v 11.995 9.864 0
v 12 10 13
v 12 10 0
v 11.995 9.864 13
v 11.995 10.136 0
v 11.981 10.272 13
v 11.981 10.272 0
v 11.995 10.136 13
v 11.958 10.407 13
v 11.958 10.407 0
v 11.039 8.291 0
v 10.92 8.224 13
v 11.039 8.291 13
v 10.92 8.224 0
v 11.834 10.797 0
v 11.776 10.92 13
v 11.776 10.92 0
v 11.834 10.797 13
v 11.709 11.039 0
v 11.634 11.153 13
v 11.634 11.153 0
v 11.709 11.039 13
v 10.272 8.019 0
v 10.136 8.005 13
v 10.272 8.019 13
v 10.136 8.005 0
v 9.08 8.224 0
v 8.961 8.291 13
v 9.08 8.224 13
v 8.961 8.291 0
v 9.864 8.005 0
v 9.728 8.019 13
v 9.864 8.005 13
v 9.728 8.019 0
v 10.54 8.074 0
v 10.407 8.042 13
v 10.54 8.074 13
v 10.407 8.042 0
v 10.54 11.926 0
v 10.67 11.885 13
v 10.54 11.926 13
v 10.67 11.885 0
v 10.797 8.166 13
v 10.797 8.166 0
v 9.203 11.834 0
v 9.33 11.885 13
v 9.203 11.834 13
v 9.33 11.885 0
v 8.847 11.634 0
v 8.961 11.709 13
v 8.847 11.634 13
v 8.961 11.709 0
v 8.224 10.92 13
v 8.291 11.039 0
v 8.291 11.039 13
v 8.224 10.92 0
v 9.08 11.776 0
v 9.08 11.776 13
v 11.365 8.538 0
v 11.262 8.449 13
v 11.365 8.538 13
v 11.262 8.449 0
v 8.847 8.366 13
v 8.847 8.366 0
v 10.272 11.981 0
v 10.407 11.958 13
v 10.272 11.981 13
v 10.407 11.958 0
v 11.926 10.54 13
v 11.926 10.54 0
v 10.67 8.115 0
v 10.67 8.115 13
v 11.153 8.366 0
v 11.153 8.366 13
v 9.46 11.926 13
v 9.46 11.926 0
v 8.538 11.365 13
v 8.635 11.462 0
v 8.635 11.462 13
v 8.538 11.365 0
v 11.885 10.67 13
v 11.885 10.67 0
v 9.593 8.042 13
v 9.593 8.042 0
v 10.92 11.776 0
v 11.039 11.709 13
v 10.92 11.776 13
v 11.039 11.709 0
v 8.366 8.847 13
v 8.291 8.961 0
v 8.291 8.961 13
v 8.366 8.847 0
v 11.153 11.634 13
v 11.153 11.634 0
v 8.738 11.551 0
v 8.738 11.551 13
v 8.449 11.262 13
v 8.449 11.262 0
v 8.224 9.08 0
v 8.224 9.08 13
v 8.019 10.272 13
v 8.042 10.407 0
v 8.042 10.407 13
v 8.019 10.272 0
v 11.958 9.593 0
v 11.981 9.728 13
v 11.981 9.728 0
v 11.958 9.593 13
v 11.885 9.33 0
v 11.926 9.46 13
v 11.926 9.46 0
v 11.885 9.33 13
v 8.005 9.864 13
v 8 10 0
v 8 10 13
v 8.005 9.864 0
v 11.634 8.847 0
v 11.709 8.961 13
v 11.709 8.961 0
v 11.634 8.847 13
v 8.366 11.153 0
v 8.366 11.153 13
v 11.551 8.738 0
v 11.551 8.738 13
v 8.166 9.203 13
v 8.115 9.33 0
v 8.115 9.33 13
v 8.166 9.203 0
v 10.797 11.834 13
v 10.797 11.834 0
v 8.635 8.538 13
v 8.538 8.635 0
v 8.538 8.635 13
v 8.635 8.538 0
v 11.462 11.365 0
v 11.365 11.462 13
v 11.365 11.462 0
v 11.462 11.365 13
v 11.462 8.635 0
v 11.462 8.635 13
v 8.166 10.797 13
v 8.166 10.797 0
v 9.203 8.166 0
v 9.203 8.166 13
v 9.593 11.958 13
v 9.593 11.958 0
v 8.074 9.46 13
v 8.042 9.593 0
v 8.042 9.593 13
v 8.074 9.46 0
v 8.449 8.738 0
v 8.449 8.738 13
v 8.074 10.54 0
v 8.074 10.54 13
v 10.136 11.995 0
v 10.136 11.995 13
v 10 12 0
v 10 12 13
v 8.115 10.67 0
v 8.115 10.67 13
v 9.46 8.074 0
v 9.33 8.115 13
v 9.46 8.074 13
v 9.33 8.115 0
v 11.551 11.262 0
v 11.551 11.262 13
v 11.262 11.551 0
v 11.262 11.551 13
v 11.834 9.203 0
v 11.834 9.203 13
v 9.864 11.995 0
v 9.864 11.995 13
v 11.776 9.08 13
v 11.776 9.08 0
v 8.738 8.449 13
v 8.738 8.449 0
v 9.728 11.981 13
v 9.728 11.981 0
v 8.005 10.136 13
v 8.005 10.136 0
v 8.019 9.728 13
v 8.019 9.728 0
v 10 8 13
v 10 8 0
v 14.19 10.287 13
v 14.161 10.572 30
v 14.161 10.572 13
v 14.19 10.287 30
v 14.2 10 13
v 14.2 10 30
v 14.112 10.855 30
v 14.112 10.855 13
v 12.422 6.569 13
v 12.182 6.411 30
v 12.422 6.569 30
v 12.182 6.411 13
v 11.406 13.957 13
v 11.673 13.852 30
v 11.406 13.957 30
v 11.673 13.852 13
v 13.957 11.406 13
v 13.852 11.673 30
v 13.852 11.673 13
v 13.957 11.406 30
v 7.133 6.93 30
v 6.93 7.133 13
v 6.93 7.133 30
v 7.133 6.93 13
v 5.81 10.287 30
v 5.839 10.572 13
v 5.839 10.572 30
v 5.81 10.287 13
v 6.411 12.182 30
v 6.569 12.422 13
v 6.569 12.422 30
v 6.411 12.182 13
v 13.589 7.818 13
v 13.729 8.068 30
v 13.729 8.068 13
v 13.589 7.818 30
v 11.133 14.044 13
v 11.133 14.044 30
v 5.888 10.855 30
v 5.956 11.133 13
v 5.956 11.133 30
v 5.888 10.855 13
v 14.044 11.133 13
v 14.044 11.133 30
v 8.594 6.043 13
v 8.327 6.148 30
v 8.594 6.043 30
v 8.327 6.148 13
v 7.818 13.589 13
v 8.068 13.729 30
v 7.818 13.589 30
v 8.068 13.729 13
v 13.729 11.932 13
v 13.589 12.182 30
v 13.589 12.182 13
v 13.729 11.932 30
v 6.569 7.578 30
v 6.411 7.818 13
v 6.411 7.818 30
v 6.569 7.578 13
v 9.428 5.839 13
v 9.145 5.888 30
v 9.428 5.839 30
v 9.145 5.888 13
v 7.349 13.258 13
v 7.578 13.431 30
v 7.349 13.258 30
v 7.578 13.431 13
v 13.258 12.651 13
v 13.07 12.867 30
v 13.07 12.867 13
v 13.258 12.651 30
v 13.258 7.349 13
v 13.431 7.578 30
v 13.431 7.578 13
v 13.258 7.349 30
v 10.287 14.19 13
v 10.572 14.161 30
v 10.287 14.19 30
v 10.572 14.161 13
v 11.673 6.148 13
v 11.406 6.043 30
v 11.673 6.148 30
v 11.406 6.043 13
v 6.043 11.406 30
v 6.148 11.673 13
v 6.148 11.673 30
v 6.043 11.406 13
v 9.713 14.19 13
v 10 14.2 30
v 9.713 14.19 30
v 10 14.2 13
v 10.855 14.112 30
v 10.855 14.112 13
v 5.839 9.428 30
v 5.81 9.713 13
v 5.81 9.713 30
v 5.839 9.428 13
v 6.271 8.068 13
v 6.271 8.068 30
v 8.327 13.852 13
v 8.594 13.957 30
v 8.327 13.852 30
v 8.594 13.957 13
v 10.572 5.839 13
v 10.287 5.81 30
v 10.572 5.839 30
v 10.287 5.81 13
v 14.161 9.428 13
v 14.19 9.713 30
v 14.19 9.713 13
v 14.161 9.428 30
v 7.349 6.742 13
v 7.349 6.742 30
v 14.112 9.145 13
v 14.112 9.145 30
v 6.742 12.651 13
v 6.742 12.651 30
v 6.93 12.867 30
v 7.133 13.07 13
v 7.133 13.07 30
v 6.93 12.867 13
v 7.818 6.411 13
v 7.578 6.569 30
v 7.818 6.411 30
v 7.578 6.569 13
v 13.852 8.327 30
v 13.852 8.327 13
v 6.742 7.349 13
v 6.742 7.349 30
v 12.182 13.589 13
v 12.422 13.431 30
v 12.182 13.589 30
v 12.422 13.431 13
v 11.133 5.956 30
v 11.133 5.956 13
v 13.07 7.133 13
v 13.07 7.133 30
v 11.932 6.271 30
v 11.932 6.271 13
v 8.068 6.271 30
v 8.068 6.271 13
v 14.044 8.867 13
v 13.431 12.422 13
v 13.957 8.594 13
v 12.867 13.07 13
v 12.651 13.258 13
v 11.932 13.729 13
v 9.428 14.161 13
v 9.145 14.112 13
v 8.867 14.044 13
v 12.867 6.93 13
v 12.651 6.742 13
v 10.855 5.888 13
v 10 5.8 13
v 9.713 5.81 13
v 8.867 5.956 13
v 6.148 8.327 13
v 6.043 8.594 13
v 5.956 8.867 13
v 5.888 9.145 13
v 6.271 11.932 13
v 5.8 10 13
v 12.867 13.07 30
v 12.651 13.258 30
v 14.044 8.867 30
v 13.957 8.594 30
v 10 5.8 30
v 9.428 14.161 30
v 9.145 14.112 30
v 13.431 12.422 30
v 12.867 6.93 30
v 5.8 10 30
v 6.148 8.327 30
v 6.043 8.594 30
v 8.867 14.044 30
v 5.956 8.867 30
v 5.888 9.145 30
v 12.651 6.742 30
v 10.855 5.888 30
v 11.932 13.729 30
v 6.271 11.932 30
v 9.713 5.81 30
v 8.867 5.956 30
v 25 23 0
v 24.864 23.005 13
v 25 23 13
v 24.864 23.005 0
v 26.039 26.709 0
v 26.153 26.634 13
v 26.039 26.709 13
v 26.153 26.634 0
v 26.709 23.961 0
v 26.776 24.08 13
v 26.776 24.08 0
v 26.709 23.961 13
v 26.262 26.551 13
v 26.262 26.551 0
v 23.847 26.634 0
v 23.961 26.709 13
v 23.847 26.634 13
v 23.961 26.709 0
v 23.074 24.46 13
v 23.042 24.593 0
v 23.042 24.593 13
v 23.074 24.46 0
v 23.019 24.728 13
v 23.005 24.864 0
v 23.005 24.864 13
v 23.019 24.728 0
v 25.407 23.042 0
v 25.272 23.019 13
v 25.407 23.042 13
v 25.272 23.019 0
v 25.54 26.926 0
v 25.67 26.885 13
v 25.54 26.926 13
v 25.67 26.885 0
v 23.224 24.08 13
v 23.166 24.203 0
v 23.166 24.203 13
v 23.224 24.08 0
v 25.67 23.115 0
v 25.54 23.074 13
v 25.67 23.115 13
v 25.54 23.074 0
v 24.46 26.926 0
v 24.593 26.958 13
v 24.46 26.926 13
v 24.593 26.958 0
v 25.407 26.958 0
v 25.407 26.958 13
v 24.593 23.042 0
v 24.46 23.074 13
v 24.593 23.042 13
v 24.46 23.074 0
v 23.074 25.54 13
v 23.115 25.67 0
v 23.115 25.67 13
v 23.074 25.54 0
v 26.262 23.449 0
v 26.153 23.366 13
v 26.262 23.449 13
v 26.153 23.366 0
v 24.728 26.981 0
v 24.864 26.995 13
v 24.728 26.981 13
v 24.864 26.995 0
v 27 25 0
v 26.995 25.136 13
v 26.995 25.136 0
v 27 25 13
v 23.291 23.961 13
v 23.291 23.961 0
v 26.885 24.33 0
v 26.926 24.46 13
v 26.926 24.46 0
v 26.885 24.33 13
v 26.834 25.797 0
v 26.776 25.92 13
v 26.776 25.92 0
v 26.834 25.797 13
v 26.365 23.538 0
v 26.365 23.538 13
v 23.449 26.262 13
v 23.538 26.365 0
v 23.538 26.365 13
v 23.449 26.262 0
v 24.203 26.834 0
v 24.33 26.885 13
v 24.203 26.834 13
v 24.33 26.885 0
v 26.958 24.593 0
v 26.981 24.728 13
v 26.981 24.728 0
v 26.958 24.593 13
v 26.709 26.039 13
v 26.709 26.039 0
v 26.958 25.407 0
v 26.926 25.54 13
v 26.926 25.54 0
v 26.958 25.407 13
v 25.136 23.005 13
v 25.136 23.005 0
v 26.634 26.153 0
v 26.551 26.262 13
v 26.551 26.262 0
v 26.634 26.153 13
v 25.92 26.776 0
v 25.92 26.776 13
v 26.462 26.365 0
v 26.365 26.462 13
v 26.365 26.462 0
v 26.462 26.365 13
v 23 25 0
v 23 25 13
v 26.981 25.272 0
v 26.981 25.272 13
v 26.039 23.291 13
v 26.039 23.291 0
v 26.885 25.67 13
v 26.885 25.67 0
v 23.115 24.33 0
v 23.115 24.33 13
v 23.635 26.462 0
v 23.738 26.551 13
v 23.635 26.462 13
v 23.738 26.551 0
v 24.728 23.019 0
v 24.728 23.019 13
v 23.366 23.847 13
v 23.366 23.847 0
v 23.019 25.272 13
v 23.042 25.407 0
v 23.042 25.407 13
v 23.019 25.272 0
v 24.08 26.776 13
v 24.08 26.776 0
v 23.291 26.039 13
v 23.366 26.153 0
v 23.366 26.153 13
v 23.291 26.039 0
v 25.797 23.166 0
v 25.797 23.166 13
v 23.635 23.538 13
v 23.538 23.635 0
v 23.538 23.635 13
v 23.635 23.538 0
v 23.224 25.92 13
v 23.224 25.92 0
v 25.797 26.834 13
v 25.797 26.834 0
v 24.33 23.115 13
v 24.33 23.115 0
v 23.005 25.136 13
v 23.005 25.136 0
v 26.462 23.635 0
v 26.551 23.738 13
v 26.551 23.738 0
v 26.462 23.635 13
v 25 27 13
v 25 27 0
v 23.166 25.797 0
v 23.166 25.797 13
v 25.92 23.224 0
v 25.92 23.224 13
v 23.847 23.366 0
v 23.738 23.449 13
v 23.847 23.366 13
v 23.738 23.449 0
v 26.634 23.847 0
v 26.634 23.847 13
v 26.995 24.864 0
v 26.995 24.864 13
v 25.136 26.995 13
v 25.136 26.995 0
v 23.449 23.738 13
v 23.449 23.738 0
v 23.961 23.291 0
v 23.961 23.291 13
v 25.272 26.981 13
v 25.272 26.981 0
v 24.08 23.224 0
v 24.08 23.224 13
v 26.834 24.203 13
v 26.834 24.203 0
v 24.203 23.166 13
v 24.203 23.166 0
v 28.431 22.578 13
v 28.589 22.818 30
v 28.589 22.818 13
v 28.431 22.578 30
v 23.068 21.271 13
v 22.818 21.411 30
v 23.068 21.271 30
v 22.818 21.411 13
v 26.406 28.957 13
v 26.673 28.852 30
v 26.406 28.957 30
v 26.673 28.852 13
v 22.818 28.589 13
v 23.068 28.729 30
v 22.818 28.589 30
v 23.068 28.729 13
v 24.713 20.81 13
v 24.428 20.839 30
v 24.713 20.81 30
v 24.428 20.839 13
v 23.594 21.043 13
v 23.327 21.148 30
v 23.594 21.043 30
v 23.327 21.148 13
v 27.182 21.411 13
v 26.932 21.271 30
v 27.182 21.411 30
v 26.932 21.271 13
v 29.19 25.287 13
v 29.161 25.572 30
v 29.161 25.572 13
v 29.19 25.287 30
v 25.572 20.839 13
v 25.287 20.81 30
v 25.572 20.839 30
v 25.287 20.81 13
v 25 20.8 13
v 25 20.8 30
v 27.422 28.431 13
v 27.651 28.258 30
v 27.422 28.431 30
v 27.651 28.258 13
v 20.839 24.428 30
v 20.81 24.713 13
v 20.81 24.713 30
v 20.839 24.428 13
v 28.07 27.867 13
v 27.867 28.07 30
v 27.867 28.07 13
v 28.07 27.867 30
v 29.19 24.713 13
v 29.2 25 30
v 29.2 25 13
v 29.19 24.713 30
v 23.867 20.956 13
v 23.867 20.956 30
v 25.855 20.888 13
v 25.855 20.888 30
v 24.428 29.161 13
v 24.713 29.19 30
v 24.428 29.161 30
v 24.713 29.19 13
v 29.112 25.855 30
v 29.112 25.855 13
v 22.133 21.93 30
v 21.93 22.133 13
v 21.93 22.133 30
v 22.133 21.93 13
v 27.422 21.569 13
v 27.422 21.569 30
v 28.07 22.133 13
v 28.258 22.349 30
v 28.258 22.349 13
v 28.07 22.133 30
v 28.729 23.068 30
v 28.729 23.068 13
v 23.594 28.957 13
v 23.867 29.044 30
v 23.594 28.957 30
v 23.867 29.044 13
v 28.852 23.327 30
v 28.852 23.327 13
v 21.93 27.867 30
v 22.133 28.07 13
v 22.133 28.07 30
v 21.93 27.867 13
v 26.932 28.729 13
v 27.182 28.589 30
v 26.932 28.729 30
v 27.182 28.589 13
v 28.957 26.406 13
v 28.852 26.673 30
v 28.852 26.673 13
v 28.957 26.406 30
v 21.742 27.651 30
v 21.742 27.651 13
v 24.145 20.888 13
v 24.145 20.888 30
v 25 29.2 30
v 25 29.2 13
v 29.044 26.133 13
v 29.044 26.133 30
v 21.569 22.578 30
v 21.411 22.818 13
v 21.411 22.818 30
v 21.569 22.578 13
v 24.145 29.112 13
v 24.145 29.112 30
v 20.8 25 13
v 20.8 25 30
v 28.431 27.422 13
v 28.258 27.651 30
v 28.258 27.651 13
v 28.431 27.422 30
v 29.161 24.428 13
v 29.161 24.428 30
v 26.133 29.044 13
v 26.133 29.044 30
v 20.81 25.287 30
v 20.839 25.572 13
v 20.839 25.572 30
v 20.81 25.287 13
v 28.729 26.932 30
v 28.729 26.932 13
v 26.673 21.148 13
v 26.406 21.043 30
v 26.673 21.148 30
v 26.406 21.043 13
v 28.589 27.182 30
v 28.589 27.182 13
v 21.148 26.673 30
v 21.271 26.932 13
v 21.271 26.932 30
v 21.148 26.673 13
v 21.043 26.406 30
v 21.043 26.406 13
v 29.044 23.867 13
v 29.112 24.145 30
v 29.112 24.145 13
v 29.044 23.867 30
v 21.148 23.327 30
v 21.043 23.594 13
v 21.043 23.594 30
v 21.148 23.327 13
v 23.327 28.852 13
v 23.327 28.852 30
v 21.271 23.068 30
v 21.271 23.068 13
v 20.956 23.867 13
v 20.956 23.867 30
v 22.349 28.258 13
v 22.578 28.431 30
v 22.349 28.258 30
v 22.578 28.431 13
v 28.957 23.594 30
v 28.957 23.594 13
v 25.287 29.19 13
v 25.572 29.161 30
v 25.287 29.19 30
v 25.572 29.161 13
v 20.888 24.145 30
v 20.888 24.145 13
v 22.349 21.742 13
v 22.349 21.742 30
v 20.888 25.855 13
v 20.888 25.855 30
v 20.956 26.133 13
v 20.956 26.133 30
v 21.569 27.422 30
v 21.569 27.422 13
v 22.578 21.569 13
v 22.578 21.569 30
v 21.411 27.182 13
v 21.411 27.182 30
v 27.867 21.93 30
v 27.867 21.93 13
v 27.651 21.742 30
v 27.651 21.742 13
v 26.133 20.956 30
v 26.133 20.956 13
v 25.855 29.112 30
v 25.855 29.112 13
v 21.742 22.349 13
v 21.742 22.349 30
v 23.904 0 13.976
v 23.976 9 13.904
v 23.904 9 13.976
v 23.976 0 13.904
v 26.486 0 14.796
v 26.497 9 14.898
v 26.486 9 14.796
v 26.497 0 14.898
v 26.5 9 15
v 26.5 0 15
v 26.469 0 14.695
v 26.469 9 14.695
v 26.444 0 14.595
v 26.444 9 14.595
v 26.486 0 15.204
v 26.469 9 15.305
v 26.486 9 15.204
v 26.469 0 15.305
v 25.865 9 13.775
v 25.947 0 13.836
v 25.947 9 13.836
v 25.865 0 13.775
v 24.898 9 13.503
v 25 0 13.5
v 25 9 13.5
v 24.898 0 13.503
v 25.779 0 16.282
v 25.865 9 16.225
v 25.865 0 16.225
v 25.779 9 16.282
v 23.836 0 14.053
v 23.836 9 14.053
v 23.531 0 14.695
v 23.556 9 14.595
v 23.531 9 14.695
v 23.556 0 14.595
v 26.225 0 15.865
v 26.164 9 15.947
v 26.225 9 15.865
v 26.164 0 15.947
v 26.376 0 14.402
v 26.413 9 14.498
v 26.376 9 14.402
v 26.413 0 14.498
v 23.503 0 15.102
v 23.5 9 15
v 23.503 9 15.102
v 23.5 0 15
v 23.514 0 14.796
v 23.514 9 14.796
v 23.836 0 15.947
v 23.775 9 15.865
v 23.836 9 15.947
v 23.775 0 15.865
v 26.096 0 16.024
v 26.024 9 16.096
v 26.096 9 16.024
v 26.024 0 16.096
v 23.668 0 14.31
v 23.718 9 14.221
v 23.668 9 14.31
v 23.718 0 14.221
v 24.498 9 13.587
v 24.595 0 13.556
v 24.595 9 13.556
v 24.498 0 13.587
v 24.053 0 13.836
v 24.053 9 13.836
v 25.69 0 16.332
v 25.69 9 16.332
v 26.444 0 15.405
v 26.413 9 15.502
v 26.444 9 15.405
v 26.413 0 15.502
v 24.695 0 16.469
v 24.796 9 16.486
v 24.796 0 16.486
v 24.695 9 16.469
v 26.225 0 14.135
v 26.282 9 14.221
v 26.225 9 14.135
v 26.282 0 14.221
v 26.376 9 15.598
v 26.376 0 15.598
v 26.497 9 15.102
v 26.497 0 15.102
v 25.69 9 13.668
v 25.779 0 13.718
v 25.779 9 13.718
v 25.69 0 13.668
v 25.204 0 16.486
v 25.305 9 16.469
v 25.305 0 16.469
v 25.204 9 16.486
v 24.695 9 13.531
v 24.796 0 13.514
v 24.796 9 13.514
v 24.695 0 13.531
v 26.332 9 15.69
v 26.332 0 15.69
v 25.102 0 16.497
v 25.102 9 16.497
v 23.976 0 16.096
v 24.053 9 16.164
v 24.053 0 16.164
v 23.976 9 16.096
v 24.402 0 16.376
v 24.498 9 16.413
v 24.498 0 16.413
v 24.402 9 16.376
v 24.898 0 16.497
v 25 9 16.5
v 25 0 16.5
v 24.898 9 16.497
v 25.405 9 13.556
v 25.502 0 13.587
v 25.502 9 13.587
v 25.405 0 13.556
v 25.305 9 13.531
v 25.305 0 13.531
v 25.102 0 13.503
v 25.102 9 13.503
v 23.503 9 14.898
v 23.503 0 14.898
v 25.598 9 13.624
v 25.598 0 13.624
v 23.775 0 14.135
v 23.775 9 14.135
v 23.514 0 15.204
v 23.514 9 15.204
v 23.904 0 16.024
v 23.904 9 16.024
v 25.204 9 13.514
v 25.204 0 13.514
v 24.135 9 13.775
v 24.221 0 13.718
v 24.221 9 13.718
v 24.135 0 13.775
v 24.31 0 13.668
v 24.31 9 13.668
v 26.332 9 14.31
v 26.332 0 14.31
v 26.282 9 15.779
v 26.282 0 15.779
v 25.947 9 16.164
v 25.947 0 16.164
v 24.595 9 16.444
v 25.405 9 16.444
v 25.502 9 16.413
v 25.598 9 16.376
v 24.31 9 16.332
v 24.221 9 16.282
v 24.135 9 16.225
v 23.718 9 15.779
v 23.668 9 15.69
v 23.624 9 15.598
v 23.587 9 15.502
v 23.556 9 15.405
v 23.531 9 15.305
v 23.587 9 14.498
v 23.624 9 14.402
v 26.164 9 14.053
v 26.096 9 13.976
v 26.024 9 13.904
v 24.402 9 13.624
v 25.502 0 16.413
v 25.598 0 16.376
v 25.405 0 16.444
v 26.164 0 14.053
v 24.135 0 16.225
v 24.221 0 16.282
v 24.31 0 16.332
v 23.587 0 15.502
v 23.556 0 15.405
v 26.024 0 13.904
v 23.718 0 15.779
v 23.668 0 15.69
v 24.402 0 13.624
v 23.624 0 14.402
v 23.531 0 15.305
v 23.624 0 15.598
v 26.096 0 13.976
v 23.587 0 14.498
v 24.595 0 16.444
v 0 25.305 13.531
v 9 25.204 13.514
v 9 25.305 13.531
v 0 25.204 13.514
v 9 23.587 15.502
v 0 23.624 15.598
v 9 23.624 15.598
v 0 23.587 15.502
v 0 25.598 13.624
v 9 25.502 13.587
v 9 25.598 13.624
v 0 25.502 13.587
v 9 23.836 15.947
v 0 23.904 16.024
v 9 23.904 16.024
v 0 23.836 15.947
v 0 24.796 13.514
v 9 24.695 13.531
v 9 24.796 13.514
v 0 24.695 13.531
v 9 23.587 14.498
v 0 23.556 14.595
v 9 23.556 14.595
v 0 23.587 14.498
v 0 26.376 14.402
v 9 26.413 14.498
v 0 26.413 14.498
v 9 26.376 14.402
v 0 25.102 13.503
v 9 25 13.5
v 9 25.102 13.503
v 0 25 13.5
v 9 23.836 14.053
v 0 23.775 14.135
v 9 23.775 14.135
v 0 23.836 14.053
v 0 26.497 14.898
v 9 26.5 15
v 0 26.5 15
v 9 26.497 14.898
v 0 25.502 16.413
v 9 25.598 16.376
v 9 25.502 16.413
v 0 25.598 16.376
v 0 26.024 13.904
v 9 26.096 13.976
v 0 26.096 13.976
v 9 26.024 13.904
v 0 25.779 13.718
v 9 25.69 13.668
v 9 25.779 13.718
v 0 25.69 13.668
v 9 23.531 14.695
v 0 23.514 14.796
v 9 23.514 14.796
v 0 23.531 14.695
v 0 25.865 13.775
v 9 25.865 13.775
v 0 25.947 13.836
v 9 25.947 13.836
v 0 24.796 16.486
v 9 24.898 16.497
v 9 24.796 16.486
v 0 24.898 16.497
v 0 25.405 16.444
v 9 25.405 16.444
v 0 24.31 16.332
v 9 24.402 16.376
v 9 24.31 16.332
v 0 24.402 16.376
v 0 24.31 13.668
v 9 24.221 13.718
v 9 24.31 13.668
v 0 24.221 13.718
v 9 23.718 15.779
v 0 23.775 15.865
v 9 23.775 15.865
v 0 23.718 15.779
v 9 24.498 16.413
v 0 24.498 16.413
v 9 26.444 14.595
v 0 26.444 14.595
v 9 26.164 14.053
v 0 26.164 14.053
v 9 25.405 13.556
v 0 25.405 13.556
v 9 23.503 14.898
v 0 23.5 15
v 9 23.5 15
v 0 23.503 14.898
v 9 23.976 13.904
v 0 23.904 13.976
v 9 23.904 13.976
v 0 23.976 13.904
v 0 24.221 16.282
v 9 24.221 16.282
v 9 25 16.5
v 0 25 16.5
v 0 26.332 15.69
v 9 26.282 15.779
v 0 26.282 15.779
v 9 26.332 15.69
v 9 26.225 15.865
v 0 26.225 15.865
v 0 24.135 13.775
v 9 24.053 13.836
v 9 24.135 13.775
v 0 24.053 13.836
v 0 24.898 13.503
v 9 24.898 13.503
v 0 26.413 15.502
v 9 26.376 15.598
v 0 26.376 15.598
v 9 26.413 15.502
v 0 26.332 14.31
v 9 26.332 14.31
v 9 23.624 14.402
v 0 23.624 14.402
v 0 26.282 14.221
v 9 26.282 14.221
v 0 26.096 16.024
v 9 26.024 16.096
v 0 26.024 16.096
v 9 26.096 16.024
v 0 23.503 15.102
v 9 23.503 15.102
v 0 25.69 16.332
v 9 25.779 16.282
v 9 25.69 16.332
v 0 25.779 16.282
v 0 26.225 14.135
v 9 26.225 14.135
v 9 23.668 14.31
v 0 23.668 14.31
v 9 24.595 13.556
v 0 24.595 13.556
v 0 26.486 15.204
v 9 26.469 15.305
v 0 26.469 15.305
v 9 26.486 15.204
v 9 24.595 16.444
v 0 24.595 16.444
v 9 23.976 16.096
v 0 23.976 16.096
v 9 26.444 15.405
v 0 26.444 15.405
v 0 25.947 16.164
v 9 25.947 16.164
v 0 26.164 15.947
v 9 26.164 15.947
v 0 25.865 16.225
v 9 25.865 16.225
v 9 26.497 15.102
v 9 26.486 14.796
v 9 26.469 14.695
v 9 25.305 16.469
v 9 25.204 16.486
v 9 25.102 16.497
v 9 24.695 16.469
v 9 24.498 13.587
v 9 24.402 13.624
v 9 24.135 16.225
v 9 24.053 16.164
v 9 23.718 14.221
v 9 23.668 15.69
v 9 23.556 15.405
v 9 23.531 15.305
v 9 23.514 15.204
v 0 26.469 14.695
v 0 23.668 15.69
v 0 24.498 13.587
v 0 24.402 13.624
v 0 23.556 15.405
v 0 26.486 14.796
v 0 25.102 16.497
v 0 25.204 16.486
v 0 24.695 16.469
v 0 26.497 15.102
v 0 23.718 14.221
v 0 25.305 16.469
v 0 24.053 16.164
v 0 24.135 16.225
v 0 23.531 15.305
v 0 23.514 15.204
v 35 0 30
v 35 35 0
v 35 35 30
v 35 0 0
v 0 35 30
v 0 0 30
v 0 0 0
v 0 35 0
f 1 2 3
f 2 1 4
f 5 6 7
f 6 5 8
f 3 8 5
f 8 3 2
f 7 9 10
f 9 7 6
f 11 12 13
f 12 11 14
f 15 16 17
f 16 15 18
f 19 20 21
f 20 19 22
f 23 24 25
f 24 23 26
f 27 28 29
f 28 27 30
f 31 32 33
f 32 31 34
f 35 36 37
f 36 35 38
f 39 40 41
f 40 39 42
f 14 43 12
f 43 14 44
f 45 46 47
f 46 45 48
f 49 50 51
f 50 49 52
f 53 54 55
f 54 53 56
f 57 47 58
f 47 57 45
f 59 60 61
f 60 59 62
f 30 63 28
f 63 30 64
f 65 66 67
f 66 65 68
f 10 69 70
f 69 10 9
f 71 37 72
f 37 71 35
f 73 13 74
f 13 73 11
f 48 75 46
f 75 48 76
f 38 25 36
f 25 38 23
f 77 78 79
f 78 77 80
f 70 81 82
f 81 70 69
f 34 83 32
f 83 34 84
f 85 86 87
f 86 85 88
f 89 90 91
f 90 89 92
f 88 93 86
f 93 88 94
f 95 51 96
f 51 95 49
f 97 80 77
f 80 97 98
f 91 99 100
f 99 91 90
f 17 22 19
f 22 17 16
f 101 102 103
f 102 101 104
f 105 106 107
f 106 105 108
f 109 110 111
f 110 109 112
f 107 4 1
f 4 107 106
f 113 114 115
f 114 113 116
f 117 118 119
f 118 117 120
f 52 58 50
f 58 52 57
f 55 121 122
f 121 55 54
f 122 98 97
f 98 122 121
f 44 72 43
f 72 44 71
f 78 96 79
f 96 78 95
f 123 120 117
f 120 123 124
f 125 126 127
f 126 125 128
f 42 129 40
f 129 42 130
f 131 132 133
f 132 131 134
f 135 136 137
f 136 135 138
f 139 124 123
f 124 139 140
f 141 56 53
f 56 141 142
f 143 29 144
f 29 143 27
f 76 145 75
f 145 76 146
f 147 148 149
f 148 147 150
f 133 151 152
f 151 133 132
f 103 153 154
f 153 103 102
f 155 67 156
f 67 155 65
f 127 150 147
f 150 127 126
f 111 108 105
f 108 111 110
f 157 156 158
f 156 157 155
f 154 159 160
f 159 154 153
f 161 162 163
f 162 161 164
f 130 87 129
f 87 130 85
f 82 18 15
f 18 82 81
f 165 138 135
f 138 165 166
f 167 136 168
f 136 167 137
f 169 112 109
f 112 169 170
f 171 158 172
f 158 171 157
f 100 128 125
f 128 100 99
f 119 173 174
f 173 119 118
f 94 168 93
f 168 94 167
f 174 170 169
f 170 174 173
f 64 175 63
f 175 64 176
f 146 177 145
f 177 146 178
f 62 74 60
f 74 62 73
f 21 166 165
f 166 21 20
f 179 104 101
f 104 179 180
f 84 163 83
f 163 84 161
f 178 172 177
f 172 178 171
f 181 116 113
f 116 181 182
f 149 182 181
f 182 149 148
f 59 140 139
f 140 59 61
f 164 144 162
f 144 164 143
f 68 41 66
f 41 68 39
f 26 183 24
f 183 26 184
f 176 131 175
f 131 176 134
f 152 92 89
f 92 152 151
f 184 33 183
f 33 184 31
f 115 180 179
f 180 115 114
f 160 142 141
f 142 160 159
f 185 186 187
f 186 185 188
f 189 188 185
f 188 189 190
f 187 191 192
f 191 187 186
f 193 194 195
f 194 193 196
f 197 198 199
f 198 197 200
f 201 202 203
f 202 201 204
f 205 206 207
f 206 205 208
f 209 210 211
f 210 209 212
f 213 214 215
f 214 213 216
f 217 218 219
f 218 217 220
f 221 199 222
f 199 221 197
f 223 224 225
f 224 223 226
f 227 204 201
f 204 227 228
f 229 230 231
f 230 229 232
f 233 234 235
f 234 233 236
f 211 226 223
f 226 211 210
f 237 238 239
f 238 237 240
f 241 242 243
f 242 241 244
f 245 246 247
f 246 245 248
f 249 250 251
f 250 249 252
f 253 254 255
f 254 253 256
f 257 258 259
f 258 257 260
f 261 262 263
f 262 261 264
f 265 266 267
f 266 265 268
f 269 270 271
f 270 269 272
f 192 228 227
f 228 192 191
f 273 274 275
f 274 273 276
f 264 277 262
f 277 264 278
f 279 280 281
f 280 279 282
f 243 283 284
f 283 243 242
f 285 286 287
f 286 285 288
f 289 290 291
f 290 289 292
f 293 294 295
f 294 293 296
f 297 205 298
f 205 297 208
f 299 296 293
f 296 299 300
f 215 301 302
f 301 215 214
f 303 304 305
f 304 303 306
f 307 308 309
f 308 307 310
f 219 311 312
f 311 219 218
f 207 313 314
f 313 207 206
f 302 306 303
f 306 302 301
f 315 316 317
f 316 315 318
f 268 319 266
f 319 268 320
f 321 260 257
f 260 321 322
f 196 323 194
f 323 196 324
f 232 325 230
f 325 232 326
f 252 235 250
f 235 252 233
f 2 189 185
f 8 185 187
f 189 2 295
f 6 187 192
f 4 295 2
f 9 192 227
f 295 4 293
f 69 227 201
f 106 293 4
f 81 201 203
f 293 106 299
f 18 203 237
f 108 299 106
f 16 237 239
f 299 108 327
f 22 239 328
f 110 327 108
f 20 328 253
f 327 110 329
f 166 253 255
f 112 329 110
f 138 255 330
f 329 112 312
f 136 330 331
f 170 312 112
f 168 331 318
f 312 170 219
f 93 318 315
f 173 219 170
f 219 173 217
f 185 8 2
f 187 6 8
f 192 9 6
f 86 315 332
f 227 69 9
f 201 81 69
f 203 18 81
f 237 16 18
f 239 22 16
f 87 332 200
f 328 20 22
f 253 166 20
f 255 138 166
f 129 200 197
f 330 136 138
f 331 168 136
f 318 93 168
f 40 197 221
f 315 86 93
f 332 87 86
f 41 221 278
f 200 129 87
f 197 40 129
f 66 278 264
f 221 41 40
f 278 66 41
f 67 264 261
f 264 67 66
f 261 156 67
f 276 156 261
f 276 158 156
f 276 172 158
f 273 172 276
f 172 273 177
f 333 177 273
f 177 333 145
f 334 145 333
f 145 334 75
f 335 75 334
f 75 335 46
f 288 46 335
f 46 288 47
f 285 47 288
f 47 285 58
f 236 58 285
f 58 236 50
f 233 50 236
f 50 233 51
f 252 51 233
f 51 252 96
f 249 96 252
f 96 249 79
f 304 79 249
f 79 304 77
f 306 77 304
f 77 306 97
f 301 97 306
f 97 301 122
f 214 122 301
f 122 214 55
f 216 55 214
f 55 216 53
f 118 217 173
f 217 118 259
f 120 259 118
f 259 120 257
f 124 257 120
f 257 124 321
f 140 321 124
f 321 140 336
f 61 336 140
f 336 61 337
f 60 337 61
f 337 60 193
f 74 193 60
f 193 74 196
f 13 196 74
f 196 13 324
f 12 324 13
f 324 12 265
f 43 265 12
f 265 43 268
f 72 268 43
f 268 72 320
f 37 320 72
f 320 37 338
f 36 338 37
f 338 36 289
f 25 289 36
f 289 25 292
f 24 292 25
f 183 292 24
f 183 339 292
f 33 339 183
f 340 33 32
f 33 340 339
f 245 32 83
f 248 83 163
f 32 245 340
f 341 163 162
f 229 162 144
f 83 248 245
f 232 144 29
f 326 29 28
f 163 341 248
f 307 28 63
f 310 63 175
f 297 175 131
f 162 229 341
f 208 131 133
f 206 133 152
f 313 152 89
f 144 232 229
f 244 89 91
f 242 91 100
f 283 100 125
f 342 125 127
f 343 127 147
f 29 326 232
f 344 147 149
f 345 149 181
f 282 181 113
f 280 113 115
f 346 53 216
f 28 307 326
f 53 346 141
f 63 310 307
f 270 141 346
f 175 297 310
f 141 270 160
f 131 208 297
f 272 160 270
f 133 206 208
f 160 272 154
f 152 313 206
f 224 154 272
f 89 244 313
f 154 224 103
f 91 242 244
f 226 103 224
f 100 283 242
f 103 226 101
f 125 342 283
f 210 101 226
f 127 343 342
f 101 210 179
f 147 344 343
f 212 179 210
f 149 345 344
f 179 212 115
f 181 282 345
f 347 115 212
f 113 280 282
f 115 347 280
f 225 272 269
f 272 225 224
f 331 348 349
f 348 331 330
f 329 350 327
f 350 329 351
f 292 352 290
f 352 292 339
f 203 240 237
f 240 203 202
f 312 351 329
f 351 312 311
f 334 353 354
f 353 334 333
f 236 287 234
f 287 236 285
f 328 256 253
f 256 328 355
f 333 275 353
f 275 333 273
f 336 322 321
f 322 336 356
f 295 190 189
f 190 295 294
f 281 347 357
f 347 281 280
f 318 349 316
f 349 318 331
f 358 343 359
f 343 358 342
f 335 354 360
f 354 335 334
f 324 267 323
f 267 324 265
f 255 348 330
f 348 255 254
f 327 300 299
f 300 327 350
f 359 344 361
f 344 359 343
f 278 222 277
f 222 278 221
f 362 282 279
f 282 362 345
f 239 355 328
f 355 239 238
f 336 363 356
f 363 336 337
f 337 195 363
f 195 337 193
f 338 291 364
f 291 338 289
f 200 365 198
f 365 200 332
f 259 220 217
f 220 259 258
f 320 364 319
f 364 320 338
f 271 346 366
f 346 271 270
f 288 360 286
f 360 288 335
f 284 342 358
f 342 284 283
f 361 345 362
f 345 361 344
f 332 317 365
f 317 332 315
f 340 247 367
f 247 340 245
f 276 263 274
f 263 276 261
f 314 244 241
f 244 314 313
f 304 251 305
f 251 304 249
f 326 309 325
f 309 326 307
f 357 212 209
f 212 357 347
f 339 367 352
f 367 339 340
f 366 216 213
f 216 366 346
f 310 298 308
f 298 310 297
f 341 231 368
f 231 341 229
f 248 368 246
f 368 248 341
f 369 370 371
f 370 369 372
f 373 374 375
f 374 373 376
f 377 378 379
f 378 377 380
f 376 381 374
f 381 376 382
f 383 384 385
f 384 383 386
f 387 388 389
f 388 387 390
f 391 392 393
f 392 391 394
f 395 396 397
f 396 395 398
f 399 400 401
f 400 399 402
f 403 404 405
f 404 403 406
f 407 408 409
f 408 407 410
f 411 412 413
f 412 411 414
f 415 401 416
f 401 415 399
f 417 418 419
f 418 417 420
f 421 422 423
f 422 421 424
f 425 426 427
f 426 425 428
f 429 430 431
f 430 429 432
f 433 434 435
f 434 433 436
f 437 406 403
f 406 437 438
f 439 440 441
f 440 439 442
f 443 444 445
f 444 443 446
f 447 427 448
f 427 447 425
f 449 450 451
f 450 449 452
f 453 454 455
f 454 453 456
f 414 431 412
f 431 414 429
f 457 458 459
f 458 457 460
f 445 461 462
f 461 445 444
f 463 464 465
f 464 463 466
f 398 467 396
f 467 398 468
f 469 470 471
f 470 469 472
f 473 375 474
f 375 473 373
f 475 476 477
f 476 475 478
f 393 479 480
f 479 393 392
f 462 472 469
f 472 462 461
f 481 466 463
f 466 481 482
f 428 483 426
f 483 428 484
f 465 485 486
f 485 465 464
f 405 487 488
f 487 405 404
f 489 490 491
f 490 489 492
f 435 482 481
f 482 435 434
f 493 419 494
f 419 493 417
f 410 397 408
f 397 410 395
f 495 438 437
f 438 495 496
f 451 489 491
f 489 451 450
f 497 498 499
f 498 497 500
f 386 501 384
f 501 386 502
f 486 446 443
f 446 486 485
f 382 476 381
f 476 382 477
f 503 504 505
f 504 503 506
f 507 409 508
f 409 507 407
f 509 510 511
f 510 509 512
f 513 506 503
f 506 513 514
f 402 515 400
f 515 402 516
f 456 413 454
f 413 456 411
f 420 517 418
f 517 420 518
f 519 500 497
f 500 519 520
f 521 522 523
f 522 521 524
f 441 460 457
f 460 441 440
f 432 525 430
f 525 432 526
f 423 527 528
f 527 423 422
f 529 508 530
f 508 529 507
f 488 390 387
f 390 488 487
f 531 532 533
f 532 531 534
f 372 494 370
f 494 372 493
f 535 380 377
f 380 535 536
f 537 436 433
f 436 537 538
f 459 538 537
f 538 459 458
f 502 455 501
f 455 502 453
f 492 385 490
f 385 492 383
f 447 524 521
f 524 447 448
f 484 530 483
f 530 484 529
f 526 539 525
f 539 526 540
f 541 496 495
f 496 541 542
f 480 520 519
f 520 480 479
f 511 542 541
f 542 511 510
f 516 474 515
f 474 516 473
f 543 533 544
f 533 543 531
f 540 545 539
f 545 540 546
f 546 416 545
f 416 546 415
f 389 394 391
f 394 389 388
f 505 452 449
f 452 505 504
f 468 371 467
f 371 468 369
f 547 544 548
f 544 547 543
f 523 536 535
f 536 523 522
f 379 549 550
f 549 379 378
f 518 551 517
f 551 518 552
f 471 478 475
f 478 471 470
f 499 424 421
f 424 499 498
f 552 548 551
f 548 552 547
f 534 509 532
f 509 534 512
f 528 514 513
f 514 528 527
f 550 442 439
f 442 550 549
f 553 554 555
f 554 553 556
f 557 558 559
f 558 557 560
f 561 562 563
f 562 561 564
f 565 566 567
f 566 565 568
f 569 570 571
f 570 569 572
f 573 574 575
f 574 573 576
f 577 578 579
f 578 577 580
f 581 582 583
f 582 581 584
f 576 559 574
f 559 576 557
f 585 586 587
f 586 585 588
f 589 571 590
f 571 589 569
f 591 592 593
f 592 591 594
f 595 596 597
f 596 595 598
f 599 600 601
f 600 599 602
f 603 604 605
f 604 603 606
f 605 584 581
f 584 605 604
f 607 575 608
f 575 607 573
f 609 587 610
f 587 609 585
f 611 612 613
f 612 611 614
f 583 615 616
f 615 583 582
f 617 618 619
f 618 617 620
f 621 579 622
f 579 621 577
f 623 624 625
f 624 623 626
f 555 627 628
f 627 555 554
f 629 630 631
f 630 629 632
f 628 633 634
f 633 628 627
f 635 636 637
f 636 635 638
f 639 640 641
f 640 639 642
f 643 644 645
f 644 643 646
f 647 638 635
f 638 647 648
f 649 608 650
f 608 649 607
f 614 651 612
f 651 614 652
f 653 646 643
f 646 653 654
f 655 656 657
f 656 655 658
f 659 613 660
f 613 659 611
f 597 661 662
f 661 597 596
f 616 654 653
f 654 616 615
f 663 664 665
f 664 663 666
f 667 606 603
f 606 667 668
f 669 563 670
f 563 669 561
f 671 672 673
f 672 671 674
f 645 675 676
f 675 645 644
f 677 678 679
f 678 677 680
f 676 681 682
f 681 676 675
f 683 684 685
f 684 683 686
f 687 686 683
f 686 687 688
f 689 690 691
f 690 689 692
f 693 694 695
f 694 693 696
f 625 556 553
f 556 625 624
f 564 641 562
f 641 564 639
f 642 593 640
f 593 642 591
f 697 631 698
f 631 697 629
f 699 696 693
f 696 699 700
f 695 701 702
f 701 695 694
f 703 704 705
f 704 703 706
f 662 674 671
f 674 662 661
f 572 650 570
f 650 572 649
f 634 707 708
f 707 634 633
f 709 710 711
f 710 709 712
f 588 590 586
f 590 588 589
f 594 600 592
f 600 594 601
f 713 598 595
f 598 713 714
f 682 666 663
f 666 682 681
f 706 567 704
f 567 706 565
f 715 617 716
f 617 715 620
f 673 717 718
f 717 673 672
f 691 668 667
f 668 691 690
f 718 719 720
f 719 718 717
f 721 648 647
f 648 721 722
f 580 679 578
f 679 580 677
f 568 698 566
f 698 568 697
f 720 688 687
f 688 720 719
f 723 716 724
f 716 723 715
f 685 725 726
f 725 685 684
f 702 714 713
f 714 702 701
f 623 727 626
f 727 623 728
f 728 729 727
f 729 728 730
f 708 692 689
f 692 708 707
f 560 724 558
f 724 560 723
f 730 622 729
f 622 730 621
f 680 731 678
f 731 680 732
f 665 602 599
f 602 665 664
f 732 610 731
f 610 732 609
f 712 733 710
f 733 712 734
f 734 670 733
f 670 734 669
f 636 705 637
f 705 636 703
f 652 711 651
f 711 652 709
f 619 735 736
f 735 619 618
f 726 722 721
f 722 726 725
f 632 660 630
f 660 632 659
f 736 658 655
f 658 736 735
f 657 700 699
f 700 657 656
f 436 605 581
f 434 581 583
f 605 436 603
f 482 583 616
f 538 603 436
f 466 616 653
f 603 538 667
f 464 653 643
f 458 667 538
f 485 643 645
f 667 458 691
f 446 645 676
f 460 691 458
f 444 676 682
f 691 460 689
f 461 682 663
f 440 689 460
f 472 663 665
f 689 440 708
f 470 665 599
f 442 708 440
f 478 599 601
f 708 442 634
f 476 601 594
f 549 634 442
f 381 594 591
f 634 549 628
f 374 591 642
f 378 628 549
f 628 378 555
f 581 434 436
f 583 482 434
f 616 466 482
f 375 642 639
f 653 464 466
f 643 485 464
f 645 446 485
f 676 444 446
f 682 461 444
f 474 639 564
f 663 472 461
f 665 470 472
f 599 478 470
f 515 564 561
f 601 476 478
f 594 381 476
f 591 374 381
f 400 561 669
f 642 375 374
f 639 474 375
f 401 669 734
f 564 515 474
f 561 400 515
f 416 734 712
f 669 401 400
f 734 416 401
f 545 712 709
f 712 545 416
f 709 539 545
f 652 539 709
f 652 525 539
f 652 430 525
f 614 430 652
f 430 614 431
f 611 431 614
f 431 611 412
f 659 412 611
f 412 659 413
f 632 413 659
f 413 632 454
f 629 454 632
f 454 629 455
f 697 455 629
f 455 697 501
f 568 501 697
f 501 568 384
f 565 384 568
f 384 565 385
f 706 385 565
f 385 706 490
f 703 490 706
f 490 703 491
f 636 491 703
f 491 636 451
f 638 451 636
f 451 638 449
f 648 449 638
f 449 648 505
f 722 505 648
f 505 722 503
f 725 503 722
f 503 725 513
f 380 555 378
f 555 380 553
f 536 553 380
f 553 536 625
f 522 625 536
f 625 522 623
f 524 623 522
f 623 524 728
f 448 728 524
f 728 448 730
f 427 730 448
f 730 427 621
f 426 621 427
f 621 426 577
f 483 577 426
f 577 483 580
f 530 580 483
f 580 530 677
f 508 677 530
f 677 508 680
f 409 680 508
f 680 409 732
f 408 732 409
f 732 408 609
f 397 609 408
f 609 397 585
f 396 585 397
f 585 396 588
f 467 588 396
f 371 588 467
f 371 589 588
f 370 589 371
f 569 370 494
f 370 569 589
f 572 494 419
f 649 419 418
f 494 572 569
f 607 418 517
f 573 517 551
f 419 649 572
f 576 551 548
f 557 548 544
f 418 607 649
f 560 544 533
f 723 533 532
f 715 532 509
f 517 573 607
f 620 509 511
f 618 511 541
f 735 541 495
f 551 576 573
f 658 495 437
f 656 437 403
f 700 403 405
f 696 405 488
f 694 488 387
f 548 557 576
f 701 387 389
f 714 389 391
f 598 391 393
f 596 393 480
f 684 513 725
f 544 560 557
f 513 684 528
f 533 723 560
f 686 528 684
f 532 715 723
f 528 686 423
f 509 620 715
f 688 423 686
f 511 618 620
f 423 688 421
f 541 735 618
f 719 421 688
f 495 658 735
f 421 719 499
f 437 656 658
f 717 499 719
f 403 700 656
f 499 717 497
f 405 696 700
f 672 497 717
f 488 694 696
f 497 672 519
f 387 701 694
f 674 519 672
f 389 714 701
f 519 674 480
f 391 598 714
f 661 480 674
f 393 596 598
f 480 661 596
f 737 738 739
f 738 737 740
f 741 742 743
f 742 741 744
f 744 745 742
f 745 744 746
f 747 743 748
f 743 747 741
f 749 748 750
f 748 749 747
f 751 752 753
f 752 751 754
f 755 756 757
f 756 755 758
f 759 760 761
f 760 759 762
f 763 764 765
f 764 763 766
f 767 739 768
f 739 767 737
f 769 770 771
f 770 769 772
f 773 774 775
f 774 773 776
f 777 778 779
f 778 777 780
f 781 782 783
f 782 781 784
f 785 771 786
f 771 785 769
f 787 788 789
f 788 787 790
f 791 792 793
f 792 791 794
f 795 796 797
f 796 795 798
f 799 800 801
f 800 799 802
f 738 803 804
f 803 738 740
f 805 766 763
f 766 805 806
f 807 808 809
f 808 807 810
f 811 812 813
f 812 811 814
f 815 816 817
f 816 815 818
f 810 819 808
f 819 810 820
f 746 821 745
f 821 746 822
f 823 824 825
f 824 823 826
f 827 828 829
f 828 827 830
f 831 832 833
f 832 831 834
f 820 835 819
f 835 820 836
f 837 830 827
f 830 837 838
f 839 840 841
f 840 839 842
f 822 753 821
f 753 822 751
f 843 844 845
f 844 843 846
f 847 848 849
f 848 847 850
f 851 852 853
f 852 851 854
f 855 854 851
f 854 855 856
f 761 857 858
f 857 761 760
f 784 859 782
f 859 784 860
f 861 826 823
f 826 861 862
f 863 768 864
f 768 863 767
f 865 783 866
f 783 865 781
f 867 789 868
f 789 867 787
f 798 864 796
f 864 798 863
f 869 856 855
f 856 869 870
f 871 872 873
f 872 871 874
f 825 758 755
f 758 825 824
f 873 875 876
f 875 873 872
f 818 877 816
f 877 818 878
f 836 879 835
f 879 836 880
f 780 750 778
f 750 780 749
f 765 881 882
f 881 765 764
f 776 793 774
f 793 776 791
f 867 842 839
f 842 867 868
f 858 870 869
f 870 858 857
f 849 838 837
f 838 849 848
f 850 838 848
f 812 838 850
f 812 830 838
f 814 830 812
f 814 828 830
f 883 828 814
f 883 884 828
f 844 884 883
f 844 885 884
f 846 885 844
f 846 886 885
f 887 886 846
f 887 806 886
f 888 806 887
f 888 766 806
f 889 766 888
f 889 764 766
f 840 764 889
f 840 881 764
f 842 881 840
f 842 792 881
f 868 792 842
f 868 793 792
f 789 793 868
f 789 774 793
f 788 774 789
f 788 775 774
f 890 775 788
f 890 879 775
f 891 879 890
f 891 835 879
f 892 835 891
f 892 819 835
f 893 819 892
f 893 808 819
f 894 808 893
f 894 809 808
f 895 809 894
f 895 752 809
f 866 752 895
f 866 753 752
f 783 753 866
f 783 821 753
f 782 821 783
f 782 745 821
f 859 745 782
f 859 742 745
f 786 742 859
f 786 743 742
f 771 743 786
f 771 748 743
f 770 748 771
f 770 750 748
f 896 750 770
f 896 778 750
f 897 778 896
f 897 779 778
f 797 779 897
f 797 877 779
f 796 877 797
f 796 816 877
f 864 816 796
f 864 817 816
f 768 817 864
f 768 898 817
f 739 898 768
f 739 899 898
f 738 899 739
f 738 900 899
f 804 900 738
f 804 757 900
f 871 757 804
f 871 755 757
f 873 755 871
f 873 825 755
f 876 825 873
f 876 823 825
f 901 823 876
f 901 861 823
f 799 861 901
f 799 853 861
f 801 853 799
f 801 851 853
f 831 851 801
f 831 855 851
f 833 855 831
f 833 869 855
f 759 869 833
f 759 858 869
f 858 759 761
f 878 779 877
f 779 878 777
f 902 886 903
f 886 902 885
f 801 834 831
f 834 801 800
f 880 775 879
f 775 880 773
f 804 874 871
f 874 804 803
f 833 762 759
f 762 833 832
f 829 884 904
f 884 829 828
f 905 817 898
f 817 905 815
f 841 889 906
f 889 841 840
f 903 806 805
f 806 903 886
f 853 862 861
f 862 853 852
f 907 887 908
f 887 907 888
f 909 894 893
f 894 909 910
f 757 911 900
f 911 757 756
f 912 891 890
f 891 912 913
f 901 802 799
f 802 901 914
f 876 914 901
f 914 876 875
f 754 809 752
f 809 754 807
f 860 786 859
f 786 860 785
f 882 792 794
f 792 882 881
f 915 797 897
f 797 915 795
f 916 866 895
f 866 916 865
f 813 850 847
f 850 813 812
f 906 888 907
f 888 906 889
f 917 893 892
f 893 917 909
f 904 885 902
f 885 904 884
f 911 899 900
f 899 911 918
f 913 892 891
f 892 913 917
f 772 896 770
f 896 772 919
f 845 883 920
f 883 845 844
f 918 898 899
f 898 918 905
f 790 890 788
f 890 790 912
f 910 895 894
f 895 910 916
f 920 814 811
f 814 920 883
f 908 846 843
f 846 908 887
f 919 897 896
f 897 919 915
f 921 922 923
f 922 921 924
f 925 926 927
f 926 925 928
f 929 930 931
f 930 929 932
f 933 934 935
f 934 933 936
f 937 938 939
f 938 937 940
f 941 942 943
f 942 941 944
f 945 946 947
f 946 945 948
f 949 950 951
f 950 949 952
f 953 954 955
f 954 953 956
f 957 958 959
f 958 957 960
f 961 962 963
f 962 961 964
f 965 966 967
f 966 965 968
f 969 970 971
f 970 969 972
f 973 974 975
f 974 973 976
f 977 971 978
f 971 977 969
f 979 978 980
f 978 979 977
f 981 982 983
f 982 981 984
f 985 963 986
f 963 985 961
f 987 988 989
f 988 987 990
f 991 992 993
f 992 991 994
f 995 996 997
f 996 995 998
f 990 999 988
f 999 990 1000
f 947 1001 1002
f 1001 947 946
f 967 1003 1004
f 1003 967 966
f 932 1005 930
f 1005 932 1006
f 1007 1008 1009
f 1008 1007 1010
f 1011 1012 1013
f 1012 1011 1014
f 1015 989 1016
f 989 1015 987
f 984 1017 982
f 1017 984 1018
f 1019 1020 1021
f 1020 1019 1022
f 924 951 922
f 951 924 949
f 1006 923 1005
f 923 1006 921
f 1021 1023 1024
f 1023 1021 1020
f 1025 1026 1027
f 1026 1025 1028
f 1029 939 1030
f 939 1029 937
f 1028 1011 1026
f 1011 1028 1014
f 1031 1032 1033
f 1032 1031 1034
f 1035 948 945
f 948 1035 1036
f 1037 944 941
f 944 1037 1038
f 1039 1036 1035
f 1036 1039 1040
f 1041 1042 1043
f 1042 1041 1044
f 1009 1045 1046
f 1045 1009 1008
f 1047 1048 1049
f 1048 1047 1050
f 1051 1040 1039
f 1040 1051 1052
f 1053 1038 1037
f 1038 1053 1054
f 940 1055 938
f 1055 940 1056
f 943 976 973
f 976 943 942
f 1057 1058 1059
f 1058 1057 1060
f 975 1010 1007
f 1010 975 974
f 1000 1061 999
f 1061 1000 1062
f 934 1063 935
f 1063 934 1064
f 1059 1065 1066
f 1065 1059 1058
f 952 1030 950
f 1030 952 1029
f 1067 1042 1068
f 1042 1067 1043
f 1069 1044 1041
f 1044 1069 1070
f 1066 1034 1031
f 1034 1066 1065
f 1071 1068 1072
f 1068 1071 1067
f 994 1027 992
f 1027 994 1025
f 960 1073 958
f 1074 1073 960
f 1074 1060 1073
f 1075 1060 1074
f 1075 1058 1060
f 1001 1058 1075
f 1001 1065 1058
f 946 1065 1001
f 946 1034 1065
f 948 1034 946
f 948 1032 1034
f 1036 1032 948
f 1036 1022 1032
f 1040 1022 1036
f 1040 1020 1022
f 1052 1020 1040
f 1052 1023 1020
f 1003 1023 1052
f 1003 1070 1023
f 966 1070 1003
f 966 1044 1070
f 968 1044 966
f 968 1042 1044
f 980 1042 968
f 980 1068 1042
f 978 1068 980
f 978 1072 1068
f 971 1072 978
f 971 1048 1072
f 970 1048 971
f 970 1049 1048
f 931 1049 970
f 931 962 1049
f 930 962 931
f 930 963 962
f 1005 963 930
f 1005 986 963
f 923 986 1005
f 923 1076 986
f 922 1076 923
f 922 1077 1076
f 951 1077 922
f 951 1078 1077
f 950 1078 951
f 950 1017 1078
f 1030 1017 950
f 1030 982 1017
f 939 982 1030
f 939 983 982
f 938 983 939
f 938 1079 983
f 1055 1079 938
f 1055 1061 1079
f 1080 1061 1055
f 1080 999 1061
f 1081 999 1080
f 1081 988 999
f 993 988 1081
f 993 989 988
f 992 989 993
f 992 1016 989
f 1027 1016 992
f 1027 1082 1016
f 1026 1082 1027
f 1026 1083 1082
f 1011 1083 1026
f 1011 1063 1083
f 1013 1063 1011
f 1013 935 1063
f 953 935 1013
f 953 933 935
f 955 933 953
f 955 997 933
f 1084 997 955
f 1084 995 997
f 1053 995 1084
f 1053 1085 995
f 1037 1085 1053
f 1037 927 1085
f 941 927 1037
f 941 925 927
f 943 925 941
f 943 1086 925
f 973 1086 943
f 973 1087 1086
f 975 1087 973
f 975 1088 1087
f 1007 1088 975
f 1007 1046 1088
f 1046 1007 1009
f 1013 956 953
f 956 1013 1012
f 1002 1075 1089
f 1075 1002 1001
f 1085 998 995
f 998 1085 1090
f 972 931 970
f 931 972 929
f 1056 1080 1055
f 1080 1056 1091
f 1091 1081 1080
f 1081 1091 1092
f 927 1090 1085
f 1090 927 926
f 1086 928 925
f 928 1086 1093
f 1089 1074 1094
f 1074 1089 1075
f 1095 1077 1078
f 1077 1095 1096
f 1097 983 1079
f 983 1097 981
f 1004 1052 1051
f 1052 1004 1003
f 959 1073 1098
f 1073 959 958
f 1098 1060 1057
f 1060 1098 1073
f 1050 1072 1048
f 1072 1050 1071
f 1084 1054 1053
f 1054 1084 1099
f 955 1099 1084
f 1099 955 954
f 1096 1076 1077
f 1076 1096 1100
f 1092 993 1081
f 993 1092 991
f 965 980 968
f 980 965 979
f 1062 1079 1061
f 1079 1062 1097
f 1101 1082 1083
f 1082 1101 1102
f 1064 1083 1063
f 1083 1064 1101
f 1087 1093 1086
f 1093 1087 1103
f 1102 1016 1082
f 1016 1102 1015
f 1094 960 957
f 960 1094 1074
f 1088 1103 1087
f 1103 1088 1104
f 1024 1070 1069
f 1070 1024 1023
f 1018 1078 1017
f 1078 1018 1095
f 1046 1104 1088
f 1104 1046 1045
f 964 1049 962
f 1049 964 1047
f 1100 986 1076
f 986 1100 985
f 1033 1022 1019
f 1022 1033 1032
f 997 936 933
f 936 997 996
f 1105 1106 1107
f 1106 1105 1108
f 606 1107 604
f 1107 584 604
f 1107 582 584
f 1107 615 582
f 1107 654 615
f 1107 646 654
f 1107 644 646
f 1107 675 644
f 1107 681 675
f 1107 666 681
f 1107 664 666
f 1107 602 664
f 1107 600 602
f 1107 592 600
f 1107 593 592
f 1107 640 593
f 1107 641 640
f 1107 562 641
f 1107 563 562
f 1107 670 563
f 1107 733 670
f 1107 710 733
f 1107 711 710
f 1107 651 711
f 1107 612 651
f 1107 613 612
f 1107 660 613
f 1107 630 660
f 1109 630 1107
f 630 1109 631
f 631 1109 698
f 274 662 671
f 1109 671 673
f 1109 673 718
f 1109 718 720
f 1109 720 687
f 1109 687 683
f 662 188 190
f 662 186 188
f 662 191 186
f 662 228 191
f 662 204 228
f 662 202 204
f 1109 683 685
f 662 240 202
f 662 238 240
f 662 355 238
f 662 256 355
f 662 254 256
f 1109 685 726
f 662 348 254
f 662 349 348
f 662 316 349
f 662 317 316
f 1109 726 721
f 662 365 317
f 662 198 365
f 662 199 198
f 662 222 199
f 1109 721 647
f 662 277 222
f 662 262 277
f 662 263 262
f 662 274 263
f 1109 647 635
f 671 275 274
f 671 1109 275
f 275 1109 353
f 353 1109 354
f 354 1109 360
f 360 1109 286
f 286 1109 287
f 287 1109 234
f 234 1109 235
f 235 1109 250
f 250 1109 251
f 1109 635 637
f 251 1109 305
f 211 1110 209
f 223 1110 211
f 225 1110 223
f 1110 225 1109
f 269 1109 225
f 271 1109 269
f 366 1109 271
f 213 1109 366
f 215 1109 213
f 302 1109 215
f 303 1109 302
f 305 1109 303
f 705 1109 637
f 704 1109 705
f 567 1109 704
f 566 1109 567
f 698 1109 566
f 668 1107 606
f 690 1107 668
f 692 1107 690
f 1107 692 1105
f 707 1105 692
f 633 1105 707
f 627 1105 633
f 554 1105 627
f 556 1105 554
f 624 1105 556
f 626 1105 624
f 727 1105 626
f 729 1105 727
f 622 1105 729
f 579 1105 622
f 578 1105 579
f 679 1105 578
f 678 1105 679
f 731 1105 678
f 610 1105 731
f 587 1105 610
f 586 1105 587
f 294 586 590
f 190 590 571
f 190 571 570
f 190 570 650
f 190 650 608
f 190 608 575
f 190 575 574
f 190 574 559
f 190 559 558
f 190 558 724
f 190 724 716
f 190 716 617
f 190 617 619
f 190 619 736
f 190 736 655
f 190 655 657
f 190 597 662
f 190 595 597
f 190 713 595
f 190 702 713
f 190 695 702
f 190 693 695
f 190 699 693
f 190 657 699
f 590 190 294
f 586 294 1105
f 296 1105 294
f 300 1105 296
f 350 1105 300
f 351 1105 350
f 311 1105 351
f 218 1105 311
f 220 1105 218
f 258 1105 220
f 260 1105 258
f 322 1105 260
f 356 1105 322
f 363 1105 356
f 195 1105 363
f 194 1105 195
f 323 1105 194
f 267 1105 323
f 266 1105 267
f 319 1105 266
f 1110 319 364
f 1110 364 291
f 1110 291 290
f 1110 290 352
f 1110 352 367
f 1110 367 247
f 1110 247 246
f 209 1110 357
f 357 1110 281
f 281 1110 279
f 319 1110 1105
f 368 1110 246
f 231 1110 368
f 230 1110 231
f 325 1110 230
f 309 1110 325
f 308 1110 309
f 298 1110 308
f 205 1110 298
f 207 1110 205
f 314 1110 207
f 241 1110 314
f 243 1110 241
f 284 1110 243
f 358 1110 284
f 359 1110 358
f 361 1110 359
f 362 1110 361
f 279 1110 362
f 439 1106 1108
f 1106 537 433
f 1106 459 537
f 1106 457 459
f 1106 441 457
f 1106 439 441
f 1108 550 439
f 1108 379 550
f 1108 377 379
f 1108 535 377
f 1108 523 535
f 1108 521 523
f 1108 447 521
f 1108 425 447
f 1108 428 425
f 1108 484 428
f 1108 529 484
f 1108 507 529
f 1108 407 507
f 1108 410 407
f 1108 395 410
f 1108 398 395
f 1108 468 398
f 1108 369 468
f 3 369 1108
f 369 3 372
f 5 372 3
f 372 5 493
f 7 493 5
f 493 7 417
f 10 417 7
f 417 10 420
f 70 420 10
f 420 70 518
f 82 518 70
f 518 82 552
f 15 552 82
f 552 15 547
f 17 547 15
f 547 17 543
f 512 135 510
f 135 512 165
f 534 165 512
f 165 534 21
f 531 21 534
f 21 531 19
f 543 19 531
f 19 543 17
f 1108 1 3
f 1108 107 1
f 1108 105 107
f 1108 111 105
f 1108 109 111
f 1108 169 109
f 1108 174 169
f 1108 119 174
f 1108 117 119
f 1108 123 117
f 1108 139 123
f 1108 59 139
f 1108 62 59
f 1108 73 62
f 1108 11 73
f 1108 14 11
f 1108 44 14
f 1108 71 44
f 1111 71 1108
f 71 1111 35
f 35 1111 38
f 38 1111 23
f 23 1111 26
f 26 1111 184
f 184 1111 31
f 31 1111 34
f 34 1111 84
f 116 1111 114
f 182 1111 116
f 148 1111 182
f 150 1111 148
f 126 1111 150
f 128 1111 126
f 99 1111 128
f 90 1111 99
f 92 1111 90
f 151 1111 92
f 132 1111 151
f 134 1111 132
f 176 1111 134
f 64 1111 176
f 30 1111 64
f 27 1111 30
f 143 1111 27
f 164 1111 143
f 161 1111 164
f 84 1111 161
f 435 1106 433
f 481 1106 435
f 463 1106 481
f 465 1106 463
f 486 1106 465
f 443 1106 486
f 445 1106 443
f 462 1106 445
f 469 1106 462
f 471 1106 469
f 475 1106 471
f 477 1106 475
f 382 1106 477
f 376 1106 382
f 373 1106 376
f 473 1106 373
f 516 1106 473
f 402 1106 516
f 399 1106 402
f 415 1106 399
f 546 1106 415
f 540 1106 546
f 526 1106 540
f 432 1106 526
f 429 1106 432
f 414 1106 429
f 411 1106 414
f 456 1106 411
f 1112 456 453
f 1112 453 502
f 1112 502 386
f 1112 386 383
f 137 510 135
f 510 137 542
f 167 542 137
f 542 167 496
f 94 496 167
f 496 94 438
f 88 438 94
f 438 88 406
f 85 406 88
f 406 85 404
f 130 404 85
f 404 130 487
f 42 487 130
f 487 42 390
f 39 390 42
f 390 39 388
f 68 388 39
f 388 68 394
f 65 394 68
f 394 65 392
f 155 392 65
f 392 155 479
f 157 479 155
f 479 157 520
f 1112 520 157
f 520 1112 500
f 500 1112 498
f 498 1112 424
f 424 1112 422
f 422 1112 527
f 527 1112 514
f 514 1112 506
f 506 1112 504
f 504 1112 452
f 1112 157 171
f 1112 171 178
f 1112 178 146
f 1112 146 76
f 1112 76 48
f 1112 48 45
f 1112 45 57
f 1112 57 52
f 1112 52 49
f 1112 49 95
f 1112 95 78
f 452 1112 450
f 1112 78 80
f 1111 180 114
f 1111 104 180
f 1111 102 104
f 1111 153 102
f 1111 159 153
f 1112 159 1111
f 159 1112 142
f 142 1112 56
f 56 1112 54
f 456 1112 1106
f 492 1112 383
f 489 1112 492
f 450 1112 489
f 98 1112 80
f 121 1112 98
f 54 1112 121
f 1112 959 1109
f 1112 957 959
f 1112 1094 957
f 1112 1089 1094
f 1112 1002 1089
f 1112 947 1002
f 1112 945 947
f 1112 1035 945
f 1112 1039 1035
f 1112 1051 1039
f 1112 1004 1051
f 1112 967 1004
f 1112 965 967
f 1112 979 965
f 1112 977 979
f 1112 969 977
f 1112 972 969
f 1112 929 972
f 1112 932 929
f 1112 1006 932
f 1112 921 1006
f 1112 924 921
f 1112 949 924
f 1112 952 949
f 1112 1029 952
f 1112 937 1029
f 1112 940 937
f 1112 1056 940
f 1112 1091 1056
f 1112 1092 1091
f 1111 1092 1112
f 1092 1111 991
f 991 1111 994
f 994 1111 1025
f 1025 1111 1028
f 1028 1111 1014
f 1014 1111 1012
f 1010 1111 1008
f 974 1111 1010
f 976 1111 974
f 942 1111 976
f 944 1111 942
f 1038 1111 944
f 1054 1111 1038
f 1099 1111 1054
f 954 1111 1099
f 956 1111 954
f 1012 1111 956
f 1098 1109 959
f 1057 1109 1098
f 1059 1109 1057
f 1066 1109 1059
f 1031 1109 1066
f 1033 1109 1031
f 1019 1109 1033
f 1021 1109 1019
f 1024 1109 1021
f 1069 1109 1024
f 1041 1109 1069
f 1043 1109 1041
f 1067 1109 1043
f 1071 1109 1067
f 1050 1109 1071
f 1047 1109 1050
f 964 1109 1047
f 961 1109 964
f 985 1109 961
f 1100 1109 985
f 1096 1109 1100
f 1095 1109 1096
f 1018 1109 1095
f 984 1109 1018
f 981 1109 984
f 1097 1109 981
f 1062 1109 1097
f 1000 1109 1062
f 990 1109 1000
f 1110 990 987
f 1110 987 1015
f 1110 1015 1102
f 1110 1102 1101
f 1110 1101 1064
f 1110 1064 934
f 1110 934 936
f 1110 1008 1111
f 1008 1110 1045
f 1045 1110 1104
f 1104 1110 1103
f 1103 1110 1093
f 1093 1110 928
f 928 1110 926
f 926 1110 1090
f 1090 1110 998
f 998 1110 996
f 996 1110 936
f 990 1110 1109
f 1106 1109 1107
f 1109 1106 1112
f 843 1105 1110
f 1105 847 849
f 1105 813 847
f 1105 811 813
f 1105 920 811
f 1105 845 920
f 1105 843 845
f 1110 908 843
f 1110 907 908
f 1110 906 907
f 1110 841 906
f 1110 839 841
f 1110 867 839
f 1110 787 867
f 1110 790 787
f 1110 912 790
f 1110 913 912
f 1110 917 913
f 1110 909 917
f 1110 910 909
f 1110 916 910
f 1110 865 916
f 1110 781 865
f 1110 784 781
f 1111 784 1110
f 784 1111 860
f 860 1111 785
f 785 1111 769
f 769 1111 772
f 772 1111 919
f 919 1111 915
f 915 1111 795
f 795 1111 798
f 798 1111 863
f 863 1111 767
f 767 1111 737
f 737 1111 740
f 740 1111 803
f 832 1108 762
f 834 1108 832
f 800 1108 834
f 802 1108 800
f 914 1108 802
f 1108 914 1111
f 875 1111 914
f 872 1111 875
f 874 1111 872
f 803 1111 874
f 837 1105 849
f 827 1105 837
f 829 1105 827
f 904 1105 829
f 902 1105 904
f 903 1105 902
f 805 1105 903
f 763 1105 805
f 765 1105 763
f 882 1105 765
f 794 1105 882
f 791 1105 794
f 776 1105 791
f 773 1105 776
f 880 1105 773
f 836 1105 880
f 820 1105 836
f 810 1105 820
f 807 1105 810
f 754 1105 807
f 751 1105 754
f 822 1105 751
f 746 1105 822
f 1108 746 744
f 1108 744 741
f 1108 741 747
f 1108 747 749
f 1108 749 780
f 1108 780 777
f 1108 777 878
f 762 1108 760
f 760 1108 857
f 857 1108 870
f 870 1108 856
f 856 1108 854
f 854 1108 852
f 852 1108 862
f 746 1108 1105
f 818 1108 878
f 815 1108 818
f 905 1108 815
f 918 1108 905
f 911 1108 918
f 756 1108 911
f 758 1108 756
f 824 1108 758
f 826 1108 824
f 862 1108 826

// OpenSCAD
$fn=92;
difference(){
    union(){
        cube([35,35,30]);
    }
    union(){
        translate([10,10,-1]) cylinder(r=2, h=45);
        translate([10,10,13]) cylinder(r=4.2, h=45);
        translate([25,25,-1]) cylinder(r=2, h=45);
        translate([25,25,13]) cylinder(r=4.2, h=45);
        translate([25,-1,15]) rotate([-90,0,0]) cylinder(r=1.5, h=10);
        translate([-1,25,15]) rotate([0,90,0]) cylinder(r=1.5, h=10);
    }
}
    
